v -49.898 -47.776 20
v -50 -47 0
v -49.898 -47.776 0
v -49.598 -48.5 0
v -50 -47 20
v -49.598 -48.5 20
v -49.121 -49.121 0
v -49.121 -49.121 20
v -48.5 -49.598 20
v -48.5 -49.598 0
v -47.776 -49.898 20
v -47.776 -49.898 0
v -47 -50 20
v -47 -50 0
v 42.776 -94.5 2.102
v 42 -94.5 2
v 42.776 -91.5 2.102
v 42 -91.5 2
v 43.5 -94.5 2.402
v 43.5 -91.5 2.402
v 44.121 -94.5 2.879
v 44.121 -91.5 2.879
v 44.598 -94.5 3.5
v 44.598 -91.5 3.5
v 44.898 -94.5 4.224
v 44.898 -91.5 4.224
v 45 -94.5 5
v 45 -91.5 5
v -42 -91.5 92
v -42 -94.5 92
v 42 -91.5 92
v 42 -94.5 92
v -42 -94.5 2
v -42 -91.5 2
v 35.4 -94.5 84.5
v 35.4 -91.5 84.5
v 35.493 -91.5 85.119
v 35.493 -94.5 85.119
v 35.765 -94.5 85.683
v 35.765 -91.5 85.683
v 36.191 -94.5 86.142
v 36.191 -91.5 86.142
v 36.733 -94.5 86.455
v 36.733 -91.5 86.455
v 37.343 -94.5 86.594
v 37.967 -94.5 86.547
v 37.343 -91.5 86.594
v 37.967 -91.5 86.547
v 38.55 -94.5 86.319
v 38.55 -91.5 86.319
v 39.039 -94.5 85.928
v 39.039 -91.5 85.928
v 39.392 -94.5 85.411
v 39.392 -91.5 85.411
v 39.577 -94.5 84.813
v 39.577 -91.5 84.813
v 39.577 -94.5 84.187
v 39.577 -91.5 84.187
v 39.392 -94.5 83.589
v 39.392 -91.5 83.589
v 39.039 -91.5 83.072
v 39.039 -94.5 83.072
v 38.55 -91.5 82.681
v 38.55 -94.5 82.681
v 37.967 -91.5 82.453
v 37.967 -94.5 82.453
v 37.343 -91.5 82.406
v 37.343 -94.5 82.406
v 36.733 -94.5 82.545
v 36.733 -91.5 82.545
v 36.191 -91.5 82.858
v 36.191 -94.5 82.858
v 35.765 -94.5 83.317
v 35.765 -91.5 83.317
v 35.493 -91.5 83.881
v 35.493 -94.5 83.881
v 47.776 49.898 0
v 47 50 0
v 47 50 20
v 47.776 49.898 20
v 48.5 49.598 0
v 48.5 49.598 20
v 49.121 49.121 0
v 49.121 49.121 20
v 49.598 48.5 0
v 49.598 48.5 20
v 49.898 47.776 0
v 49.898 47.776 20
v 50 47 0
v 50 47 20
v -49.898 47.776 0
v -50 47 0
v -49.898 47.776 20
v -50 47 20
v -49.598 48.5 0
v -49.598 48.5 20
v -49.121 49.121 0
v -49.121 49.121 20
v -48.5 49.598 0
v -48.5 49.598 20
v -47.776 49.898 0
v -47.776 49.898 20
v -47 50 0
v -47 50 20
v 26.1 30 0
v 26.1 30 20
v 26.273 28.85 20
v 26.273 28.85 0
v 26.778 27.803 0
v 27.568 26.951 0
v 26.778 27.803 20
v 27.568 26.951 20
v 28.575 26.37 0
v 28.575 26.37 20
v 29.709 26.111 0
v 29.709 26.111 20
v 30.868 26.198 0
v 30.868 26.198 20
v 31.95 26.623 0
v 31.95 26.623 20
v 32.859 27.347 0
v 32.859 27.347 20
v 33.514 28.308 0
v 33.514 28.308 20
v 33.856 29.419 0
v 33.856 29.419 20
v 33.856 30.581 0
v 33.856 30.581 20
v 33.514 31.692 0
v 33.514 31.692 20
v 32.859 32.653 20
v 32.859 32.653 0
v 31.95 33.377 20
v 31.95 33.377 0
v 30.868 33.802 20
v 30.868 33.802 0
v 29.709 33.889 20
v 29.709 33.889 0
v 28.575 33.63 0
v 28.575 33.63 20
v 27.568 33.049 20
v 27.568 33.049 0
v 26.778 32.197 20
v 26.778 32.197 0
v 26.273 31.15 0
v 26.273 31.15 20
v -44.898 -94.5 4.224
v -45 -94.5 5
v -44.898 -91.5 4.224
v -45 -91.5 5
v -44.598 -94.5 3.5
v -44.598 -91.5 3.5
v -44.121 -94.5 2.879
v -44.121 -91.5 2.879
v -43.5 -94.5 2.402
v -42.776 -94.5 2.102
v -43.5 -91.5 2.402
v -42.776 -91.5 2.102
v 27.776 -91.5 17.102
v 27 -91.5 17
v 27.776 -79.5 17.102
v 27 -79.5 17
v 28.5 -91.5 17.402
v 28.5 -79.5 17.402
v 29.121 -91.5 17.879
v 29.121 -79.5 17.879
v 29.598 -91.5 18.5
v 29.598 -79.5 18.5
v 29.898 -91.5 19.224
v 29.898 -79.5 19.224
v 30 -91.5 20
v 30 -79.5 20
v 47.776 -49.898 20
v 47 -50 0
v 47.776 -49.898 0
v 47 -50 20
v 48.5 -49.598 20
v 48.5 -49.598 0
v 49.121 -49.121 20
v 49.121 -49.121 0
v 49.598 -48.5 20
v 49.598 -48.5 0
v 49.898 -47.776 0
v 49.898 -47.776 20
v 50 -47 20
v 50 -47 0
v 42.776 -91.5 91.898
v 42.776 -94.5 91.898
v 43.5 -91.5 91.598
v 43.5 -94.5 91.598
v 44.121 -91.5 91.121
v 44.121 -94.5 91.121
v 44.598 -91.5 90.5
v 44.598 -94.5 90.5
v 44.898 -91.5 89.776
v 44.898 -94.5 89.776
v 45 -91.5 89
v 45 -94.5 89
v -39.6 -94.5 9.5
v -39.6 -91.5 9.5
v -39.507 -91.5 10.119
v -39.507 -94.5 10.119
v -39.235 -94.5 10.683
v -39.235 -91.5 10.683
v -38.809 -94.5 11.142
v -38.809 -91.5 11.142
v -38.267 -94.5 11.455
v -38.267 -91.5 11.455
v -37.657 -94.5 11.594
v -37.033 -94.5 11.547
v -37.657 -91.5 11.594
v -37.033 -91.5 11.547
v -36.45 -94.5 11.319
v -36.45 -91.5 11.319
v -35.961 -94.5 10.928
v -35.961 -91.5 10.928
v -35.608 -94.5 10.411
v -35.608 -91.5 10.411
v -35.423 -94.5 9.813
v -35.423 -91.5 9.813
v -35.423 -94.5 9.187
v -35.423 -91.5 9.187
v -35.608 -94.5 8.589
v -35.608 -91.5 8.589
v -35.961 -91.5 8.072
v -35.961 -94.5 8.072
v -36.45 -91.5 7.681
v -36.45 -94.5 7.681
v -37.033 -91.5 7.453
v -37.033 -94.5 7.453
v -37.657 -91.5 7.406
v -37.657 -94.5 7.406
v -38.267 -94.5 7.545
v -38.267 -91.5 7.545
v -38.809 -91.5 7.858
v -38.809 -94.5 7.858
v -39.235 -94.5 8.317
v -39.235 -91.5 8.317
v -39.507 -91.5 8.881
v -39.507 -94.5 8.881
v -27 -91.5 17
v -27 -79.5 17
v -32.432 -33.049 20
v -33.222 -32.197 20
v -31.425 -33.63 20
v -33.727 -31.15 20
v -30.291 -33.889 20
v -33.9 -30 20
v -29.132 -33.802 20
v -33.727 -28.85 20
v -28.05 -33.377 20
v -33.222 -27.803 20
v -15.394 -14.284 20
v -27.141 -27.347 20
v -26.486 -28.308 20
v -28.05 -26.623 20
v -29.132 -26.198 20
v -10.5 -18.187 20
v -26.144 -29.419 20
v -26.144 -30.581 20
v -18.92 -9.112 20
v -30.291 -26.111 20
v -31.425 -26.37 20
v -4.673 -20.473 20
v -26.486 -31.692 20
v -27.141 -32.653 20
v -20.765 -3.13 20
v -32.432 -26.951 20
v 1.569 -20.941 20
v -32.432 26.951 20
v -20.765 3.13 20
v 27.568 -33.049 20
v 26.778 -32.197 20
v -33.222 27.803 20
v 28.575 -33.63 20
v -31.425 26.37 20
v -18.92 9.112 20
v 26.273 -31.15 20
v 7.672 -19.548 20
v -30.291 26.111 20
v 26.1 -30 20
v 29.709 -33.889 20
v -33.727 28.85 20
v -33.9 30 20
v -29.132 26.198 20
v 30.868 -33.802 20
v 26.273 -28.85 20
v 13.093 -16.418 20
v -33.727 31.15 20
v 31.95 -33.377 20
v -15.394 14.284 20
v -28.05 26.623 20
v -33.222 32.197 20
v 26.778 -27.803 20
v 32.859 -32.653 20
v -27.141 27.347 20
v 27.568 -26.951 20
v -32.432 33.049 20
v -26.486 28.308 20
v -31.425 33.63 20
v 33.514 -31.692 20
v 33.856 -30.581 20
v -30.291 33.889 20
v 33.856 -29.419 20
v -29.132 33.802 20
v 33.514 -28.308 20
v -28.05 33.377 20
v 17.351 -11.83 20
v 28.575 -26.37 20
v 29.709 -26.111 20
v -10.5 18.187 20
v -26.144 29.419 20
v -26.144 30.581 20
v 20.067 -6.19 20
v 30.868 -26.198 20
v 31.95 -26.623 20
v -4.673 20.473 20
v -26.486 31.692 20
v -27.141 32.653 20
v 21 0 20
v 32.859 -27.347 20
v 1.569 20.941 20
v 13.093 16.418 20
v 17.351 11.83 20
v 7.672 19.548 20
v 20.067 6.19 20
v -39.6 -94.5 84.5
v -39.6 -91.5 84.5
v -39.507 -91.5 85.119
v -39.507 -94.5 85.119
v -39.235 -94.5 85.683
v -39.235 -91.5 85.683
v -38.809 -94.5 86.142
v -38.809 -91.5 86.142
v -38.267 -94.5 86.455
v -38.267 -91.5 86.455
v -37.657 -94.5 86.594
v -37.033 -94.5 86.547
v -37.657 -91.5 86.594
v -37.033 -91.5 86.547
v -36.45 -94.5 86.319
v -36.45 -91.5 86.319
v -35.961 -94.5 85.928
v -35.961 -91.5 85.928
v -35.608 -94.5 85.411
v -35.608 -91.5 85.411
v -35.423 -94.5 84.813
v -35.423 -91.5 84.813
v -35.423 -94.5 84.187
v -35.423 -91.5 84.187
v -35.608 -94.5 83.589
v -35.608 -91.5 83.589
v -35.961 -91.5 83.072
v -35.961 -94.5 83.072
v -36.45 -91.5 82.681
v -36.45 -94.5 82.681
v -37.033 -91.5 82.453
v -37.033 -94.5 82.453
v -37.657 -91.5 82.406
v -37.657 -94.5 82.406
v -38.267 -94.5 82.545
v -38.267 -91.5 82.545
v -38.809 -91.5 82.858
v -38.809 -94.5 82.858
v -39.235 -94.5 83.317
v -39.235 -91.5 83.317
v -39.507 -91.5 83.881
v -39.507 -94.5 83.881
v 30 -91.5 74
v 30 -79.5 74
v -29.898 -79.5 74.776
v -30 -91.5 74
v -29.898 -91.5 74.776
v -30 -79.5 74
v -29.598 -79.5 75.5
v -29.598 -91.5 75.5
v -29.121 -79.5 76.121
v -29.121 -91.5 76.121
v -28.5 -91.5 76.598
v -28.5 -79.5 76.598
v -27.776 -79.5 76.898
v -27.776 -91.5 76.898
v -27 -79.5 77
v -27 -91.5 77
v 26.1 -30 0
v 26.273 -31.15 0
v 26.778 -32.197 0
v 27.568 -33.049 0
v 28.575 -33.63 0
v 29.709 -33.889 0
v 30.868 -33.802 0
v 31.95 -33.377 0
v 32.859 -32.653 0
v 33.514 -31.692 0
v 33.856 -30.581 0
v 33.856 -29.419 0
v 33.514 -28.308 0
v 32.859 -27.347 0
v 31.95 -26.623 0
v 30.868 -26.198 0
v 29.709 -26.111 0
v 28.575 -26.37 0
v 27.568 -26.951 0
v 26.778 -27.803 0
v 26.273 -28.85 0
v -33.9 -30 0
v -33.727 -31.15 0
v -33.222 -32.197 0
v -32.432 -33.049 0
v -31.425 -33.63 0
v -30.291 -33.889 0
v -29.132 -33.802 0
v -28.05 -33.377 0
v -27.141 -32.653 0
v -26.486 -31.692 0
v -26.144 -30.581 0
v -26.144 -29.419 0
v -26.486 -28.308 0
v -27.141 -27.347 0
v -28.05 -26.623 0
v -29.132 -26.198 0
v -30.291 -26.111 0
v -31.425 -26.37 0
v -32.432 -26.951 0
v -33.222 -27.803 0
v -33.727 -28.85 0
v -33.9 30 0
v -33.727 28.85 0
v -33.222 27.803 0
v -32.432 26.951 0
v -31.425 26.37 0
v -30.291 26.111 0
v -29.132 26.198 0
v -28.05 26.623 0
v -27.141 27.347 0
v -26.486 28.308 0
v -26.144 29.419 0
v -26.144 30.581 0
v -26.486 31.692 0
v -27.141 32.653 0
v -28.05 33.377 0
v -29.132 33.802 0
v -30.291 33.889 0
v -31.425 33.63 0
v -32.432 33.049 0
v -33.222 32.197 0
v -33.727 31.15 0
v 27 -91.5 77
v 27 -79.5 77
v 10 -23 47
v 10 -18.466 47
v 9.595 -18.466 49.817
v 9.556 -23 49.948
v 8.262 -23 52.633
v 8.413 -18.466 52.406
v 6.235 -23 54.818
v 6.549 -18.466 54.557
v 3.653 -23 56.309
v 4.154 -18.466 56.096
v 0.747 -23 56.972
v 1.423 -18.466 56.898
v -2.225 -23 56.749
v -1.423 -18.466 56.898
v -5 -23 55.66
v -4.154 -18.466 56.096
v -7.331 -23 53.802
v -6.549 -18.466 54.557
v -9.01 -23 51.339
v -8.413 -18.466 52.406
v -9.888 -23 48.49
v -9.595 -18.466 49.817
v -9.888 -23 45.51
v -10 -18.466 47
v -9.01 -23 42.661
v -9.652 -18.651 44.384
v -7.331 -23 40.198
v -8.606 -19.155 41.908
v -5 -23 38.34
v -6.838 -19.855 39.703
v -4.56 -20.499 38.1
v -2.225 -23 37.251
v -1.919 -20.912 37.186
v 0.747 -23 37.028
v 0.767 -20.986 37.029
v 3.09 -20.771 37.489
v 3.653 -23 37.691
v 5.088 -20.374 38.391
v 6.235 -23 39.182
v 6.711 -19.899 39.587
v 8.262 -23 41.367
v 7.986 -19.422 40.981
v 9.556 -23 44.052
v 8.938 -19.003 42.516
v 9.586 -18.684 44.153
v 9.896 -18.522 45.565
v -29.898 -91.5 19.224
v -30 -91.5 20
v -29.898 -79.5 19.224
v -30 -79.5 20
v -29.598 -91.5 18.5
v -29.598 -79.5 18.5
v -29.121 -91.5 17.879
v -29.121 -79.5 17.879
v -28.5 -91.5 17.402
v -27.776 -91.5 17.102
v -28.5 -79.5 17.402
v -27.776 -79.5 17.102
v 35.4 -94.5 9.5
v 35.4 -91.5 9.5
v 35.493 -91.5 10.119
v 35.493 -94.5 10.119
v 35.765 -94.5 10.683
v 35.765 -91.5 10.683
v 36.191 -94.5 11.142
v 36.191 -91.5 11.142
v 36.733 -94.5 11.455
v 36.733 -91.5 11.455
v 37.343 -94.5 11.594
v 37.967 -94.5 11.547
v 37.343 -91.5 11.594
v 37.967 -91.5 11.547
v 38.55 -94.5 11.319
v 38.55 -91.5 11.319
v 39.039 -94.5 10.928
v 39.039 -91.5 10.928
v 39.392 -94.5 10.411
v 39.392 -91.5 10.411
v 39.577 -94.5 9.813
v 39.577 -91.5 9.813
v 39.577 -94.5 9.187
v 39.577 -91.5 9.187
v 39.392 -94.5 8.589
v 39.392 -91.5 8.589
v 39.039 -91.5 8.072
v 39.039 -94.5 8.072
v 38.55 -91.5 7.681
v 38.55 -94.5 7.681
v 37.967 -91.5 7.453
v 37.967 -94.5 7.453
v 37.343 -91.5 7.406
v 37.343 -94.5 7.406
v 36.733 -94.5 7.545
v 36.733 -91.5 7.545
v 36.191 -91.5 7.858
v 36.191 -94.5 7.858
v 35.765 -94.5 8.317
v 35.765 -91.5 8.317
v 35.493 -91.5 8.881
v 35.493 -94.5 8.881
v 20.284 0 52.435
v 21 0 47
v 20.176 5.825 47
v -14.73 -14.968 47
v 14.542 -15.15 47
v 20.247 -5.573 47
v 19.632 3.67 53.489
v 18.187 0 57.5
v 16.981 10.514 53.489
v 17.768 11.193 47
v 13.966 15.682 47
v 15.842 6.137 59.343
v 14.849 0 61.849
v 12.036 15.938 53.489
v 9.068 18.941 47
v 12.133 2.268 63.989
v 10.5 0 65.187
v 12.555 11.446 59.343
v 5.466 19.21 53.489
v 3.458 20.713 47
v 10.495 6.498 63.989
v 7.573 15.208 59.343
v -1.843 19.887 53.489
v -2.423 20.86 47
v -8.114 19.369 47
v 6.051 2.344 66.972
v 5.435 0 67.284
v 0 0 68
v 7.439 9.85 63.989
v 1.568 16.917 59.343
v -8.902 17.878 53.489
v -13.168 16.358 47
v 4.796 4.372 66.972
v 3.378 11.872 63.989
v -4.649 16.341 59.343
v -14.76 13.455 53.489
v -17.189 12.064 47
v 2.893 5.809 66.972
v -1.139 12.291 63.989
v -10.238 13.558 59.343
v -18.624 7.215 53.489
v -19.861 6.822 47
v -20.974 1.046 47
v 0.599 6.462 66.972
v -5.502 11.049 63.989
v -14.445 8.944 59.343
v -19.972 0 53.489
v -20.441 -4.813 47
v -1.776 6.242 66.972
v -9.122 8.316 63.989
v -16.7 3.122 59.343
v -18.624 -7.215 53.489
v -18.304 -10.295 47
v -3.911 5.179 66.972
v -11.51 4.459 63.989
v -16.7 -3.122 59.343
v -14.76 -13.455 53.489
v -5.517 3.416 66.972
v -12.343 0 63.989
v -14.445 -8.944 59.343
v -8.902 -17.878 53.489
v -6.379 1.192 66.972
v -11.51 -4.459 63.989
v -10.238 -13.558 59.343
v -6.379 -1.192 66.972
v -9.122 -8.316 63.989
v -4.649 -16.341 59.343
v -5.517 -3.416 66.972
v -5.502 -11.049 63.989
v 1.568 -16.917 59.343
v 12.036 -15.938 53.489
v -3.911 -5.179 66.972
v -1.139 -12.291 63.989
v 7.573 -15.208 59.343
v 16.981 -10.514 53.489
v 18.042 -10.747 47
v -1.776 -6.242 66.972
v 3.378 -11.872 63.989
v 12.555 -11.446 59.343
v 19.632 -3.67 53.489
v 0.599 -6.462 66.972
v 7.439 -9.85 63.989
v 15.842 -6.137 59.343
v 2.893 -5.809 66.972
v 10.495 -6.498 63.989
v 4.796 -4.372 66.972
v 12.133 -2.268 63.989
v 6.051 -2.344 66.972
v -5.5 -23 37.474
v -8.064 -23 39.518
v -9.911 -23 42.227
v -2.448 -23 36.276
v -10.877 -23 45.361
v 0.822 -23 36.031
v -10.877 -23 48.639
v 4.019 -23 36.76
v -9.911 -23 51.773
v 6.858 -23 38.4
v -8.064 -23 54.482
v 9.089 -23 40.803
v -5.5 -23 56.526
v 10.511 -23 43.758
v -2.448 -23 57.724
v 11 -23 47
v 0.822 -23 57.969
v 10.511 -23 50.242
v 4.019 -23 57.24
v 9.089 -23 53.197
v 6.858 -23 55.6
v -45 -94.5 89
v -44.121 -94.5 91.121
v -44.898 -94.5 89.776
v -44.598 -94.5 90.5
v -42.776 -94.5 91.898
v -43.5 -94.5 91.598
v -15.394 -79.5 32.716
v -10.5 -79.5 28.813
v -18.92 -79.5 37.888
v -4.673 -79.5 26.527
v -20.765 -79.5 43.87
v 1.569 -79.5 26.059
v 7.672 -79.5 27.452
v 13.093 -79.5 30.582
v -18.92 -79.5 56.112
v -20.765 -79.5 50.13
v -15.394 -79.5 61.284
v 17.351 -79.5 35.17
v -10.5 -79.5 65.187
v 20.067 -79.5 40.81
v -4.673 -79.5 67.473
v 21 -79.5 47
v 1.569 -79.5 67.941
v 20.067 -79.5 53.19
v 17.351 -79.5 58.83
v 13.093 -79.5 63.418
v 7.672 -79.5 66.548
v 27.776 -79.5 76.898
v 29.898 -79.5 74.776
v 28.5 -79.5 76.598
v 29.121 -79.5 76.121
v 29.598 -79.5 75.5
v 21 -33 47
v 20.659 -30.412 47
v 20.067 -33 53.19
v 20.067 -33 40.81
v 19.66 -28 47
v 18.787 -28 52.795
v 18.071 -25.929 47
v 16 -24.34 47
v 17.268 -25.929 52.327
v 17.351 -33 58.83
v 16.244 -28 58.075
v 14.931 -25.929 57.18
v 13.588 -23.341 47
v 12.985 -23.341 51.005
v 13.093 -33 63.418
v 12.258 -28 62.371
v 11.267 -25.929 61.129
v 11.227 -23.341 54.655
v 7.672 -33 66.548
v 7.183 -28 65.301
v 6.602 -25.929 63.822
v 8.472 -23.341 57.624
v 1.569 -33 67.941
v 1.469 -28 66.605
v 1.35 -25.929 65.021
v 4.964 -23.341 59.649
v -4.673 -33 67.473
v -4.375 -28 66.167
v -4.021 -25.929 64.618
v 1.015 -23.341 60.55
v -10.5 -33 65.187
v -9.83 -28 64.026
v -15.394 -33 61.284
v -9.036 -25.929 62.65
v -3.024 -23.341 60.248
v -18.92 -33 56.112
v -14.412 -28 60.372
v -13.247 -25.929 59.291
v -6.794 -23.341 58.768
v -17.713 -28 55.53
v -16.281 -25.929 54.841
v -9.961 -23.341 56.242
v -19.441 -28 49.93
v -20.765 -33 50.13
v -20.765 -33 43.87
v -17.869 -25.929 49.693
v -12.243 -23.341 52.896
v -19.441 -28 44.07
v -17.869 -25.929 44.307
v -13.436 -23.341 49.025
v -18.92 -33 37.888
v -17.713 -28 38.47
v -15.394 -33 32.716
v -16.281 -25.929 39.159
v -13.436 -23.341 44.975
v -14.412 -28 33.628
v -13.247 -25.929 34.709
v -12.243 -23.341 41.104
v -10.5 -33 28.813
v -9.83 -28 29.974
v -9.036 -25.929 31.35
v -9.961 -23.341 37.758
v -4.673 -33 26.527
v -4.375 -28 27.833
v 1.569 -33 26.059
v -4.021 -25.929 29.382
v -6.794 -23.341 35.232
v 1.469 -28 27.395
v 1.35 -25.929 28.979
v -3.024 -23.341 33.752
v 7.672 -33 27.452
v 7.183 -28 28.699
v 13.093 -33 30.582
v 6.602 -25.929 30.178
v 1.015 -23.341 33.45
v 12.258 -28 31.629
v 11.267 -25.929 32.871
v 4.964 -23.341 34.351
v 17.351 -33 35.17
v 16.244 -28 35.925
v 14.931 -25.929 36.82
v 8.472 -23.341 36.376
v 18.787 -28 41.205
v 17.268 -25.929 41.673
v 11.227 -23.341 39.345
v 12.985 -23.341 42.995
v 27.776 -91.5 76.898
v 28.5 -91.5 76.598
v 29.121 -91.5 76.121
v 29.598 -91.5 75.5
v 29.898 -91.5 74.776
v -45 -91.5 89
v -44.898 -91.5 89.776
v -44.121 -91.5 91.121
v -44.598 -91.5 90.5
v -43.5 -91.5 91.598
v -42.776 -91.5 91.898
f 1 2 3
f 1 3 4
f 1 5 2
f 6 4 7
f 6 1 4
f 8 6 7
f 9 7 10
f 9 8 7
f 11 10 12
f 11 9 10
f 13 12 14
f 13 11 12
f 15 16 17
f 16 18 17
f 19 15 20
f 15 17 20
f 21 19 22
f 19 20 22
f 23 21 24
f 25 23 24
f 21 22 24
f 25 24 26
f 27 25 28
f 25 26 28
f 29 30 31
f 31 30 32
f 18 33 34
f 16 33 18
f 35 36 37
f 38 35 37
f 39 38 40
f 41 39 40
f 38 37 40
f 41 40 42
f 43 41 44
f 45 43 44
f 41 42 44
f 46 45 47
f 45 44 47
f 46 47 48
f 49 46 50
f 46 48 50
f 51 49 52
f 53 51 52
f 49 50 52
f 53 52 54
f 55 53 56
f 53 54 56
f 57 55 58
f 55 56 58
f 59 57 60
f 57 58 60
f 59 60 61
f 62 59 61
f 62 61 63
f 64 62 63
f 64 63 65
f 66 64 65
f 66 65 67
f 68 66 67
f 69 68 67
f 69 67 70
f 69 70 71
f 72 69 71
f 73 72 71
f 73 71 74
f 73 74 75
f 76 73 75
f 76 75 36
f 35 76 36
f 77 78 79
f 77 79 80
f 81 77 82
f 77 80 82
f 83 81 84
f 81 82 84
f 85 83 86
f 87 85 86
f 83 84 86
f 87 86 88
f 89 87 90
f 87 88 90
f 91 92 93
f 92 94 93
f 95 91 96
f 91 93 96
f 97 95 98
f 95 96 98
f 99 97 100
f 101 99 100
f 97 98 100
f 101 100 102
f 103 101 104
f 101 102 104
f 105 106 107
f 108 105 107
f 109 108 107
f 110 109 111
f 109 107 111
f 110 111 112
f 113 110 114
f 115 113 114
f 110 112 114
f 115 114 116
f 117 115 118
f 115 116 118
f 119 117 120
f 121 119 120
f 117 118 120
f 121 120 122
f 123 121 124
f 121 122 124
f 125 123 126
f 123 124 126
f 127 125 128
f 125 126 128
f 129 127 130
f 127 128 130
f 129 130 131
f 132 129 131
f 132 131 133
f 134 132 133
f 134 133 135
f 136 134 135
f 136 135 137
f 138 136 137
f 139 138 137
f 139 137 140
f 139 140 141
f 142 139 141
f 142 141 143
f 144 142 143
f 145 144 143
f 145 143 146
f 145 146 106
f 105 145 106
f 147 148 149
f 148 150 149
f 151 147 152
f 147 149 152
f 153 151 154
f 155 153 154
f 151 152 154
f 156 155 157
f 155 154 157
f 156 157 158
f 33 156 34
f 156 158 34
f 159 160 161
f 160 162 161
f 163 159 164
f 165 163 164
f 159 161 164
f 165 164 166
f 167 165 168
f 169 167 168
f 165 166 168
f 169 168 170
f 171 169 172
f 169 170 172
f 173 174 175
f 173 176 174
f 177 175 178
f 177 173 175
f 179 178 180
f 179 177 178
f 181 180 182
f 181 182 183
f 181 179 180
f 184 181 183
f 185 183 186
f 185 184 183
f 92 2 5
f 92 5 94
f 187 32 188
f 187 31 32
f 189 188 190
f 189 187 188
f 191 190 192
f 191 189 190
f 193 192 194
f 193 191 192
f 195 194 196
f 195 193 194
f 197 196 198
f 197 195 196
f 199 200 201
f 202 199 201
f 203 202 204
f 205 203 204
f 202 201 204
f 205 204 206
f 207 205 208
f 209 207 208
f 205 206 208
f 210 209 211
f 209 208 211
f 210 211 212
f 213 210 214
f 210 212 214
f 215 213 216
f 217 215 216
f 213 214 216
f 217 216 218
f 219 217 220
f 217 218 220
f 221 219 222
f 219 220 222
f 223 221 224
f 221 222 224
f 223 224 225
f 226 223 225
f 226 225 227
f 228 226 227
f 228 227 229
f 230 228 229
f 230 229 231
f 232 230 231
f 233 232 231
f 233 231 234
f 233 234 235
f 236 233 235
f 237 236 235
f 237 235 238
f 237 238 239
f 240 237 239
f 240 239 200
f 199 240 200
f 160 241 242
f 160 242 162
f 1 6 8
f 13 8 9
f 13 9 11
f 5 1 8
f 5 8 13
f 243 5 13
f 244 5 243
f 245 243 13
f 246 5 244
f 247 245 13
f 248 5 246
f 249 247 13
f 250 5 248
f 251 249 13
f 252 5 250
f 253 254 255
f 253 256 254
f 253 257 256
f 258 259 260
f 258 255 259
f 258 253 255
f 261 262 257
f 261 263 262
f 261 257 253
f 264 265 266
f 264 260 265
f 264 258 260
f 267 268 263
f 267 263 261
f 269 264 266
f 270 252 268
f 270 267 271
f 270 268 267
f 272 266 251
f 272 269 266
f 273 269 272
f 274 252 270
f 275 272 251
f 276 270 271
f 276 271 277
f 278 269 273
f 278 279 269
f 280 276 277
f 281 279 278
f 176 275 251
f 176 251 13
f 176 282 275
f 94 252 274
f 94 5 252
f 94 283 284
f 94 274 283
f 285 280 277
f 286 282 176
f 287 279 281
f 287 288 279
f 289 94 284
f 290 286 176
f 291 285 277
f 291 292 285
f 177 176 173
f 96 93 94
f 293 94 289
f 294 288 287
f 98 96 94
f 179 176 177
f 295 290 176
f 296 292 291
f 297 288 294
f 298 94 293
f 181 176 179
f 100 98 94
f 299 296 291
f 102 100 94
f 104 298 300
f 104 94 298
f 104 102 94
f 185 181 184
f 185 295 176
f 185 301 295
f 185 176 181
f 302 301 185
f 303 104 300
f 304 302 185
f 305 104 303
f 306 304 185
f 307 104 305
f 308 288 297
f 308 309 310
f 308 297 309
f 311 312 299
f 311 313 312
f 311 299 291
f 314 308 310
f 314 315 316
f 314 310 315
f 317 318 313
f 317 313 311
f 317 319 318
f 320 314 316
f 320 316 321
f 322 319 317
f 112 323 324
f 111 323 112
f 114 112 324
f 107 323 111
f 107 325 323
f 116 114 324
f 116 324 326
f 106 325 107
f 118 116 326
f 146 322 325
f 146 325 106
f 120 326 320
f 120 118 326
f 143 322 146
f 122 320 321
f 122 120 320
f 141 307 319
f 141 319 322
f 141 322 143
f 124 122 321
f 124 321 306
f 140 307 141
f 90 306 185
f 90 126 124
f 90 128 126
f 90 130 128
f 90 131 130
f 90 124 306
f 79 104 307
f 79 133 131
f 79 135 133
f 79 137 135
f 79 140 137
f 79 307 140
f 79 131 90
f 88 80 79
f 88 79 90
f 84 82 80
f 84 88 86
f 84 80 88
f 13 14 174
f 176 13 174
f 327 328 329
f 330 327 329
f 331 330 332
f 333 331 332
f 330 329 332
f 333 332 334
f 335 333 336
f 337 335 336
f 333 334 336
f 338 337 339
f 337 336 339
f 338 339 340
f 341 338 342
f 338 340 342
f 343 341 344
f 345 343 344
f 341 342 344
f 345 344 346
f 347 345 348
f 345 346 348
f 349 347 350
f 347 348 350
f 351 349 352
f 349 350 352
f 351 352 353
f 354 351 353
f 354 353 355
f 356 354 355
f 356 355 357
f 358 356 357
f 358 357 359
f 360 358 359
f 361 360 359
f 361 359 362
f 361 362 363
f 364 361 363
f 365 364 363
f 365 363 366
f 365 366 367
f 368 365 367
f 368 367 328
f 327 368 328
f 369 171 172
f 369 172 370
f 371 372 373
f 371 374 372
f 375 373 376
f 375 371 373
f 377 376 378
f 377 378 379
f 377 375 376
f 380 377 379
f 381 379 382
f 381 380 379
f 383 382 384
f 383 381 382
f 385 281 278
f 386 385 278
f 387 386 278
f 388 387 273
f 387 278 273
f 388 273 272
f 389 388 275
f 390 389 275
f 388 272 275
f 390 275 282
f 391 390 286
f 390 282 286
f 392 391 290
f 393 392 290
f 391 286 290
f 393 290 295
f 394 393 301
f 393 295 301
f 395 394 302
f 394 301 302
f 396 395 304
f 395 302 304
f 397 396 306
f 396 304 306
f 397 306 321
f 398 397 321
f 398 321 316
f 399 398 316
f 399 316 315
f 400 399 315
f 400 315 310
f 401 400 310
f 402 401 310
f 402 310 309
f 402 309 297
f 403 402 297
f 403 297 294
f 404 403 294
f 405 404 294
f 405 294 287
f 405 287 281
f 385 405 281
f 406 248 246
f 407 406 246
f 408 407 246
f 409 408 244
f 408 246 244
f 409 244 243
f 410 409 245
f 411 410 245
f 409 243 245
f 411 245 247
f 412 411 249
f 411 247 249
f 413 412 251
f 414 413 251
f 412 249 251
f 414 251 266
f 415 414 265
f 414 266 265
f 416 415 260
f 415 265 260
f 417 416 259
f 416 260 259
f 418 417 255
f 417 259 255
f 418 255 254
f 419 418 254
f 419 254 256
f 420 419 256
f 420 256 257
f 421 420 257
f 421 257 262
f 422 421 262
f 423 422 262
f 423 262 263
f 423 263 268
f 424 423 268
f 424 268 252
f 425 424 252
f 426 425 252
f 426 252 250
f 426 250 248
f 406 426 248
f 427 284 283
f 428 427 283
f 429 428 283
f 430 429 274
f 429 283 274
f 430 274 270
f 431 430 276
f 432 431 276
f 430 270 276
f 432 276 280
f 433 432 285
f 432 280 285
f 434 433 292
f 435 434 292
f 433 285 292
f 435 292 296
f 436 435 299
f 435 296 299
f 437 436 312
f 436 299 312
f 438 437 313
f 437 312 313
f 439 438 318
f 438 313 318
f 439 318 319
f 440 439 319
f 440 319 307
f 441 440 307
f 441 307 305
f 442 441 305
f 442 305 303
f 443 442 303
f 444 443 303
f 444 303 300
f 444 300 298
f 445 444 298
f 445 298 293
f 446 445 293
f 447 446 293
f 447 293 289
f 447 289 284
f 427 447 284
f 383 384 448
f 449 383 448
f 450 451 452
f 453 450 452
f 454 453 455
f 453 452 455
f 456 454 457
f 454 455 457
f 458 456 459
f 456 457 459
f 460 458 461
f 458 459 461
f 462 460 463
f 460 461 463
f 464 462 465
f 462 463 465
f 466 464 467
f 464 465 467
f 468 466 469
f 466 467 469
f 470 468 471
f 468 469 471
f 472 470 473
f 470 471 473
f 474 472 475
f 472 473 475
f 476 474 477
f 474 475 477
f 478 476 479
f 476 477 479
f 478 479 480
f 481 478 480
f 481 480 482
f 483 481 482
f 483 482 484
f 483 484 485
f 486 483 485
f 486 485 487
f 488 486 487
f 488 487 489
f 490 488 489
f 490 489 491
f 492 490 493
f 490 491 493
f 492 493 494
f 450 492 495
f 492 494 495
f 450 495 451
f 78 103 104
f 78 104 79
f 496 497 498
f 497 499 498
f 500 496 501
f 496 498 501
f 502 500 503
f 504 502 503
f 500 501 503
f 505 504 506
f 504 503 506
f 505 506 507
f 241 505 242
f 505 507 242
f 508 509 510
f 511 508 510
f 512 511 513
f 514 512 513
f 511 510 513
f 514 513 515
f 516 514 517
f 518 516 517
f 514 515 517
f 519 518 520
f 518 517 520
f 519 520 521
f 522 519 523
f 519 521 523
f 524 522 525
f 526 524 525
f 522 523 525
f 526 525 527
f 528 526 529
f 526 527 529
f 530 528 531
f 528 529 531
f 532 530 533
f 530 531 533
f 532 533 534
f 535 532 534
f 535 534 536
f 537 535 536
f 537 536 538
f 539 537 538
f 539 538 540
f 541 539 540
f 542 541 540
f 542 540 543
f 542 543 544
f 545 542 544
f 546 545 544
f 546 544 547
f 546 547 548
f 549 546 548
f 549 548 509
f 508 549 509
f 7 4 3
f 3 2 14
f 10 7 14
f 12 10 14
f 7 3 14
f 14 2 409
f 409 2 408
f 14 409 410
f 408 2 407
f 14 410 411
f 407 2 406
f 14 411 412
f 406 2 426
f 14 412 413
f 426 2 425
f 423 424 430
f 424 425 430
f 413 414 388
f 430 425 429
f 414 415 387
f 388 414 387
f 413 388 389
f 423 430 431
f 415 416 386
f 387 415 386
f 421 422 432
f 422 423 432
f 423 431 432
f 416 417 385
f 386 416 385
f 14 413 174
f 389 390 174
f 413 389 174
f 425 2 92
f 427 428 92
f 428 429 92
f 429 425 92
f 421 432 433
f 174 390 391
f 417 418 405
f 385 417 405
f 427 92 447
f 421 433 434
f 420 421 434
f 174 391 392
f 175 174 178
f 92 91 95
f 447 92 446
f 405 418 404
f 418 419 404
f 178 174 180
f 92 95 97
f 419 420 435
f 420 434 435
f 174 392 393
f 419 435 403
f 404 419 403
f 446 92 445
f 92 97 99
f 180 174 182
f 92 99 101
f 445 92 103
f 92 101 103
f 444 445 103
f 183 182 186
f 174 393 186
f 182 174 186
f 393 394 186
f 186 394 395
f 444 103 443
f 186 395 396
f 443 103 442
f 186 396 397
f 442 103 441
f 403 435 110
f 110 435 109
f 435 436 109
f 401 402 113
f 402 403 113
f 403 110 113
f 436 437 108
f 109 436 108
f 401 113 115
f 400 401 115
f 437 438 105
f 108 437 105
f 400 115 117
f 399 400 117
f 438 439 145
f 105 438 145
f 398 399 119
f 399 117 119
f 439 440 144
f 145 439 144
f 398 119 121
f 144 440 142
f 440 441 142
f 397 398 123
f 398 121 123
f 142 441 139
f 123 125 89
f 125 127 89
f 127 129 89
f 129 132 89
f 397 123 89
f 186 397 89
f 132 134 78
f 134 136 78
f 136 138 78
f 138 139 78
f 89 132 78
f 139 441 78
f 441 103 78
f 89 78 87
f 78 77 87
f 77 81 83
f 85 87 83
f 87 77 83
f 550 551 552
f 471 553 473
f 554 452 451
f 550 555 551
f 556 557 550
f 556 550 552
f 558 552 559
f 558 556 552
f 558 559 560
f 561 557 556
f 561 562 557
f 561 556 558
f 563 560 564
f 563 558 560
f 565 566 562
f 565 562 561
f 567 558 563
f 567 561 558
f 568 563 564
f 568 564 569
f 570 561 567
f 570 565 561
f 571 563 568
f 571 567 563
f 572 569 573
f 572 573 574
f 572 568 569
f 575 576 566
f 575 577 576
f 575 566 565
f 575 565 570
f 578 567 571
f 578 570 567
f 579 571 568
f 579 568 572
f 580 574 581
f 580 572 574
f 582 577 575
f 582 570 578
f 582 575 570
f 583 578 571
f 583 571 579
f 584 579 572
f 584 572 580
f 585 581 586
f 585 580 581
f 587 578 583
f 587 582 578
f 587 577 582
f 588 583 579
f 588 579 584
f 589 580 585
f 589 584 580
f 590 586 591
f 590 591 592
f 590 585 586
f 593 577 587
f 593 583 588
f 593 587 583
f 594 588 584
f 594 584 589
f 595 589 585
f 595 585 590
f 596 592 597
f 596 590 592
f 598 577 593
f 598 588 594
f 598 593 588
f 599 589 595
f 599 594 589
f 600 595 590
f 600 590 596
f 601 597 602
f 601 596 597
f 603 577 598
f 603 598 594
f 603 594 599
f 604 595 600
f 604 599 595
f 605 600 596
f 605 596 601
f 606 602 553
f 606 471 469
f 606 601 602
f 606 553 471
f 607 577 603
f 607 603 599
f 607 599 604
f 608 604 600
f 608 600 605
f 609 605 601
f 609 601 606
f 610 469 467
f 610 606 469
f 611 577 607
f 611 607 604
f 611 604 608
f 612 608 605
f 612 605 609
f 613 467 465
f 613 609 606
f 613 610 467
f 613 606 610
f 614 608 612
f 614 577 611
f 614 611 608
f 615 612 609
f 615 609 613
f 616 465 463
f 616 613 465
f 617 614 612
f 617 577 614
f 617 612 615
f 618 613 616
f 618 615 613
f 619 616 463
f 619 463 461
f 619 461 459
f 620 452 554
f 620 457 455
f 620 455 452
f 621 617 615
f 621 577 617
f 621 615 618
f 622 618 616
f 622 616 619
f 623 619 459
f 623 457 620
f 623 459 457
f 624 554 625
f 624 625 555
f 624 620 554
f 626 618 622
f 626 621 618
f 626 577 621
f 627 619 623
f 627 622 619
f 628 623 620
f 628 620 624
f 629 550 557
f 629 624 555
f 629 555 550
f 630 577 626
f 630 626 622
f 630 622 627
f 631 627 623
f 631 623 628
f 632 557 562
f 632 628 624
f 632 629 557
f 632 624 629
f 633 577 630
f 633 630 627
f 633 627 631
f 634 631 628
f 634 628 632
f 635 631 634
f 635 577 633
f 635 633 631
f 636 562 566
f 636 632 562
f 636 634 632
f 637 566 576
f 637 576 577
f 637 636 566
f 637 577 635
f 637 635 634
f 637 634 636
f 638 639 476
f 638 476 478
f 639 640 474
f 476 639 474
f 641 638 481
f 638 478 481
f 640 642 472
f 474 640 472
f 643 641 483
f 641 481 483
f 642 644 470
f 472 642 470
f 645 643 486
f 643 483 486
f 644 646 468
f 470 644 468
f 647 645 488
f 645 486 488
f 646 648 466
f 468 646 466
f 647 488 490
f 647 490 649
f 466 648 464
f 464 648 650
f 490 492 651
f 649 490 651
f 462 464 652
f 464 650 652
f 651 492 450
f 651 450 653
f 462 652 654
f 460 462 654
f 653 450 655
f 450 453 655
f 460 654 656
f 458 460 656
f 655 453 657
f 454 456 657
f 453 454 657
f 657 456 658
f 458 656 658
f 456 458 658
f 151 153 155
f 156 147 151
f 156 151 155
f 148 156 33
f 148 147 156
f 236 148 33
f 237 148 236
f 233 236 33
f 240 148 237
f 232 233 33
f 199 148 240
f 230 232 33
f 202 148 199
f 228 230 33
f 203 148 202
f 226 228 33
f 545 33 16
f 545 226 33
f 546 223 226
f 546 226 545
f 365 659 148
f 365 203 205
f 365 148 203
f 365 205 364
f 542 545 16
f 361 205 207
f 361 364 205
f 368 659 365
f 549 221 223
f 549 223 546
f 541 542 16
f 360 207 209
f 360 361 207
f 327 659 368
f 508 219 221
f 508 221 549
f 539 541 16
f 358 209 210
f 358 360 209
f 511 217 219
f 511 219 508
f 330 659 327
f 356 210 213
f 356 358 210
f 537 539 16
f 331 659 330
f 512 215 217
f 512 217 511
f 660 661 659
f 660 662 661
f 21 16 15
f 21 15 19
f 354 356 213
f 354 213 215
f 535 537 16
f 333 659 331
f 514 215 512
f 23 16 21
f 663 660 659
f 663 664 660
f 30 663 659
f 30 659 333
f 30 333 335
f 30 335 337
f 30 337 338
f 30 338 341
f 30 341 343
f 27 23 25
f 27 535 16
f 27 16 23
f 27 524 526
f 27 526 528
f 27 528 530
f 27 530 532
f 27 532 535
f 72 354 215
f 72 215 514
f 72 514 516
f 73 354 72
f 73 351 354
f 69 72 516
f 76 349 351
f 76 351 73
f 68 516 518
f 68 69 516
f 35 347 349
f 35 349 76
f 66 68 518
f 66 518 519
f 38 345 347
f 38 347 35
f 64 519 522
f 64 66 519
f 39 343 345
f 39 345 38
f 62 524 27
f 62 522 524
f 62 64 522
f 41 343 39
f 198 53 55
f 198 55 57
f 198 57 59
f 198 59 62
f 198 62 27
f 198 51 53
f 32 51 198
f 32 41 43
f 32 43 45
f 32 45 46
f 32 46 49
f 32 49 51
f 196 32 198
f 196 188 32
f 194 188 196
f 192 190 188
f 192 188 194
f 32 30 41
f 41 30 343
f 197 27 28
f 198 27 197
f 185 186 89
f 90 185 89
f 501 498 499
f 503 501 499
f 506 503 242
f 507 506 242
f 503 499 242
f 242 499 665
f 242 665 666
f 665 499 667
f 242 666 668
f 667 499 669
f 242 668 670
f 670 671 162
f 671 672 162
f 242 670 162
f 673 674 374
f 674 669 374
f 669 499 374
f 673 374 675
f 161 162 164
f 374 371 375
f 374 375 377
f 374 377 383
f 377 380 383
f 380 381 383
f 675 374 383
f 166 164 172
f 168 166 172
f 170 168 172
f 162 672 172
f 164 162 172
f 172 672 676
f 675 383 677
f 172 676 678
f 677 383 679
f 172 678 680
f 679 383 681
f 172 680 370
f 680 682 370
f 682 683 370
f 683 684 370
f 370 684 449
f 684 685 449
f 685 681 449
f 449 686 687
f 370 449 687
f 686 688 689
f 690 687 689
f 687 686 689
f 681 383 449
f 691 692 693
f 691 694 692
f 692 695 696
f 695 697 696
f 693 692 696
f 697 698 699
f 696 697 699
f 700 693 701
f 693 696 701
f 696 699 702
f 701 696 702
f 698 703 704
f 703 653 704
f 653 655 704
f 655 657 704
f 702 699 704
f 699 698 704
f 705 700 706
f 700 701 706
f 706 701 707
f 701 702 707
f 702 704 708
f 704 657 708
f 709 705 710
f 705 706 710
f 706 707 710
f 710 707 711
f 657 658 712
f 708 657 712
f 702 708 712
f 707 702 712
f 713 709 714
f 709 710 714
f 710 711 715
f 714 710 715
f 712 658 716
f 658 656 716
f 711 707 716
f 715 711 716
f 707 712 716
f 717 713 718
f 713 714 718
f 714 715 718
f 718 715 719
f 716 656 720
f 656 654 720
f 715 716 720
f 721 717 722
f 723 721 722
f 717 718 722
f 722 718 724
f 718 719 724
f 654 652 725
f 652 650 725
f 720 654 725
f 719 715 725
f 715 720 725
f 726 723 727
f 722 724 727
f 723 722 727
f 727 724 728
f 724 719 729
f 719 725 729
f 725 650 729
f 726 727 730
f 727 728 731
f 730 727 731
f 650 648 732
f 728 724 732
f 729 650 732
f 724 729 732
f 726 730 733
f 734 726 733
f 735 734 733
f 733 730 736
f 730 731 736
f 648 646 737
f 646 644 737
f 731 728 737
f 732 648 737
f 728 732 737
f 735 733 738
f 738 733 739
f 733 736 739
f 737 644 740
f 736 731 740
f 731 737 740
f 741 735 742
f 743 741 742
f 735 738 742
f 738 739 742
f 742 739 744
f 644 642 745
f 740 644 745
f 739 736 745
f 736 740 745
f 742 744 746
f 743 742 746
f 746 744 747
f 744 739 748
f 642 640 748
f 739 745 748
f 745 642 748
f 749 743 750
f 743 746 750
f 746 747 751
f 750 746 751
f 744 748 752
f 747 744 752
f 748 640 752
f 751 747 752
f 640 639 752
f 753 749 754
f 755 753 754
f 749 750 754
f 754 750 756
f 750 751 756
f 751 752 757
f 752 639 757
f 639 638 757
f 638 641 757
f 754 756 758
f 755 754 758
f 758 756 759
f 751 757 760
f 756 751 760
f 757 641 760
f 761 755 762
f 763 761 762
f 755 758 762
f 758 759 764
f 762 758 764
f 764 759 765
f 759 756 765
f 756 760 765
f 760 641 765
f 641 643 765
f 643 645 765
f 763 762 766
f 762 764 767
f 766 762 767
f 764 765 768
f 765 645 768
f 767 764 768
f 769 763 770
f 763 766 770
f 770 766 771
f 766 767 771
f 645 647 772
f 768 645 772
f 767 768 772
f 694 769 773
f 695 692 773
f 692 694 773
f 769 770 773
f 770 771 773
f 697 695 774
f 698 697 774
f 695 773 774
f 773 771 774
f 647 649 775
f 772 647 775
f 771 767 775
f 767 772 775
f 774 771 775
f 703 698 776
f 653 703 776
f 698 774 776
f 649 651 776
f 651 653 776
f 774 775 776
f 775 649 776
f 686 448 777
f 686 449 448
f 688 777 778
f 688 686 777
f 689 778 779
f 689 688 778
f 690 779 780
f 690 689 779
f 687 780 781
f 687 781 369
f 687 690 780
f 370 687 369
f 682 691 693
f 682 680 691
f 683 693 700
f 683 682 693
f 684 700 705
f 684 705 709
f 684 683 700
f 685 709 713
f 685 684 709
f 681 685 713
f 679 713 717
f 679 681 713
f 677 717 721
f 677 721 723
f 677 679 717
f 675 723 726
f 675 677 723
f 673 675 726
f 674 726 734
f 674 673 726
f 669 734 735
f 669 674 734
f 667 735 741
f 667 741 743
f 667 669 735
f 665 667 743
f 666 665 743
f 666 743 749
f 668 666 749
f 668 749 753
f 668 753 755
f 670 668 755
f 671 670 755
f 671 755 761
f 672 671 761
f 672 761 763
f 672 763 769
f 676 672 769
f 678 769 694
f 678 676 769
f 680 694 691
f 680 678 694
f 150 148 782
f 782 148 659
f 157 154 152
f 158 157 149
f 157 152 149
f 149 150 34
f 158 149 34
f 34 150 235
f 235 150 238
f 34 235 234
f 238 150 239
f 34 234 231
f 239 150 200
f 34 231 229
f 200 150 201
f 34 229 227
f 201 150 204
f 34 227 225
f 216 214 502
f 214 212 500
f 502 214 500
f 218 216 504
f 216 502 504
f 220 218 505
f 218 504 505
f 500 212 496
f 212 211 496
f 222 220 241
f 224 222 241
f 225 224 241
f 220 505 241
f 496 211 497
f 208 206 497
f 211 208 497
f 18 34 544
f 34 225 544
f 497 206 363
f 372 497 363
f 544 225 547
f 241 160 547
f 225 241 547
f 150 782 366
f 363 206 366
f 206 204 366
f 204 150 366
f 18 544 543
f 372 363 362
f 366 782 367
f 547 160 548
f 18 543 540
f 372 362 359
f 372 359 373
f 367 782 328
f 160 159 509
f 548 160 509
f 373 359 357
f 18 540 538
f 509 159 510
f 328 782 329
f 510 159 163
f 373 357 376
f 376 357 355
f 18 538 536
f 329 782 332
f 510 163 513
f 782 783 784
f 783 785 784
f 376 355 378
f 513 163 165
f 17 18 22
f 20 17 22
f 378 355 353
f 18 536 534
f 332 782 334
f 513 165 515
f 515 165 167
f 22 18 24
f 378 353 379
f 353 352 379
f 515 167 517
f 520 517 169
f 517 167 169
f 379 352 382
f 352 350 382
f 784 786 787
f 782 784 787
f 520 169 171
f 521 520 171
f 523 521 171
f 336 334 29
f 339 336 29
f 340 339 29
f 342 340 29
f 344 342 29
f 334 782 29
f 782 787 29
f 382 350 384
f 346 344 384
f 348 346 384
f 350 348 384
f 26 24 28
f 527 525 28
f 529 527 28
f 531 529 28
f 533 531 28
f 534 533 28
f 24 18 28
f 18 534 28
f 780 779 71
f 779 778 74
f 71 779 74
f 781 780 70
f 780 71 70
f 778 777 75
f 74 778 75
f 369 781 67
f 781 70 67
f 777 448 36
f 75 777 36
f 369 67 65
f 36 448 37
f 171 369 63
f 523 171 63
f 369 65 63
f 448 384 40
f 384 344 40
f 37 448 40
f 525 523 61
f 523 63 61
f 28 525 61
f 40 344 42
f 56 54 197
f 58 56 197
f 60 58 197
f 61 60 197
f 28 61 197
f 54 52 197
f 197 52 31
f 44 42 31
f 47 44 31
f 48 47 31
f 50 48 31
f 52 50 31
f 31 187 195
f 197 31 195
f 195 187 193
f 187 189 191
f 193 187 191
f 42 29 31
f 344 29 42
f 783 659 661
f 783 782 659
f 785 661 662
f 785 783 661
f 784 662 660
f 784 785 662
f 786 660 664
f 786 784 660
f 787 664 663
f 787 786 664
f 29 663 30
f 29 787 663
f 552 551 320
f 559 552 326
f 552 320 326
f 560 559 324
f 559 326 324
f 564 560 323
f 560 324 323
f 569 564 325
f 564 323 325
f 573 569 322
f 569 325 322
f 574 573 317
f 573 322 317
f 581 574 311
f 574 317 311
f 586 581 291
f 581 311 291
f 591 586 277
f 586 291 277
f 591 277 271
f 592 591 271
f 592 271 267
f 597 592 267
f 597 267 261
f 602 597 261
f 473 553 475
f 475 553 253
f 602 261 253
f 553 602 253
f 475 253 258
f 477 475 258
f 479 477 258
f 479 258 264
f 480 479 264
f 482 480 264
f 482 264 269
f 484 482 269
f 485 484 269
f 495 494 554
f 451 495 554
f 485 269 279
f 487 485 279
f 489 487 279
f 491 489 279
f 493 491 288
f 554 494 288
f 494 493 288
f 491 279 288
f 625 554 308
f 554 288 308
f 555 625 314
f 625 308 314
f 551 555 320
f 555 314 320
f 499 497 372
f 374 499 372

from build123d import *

# Parameters (mm, degrees)
F0_W          = 100
F0_H          = 100
F1_DEPTH      = 20
F2_R          = 21
F3_DEPTH      = 48
F4_R          = 21
F5_R          = 10
F6_DEPTH      = 41
F7_R          = 21
F8_DEPTH      = 53.5
F8_DEPTH_BACK = 18
F9_R          = 10
F10_W         = 60
F10_H         = 60
F11_DEPTH     = 15
F12_W         = 90
F12_H         = 90
F13_DEPTH     = 3
F15_D         = 4.2
F15_DEPTH     = 10
F15_TIP       = 1.2618073
F17_D         = 7.8
F18_R         = 3


with BuildPart() as f1:
    # F0 (on Top) → F1 (new body)
    with BuildSketch(Plane.XY):
        Rectangle(F0_W, F0_H)
    extrude(amount=F1_DEPTH)

    # F2 (on face) → F3 (join)
    with BuildSketch(Plane.XY.offset(20)):
        Circle(F2_R)
    extrude(amount=F3_DEPTH)

    # F4
    f4_edges = [f1.edges().sort_by_distance(p)[0] for p in [
        (-21, 0, 68),
    ]]
    fillet(f4_edges, radius=F4_R)

    # F5 (on Front) → F6 (join)
    with BuildSketch(Plane.XZ):
        with Locations((0, 47)):
            Circle(F5_R)
    extrude(amount=F6_DEPTH)

    # F7 (on face) → F8 (join, two sides)
    with BuildSketch(Plane.XZ.offset(41)) as f8_sk:
        with Locations((0, 47)):
            Circle(F7_R)
    extrude(amount=F8_DEPTH)
    extrude(f8_sk.sketch, amount=-F8_DEPTH_BACK)

    # F9
    f9_edges = [f1.edges().sort_by_distance(p)[0] for p in [
        (-21, -23, 47),
    ]]
    fillet(f9_edges, radius=F9_R)

    # F10 (on face) → F11 (join)
    with BuildSketch(Plane.XZ.offset(94.5)):
        with Locations((0, 47)):
            Rectangle(F10_W, F10_H)
    extrude(amount=-F11_DEPTH)

    # F12 (on face) → F13 (join)
    with BuildSketch(Plane.XZ.offset(94.5)):
        with Locations((0, 47)):
            Rectangle(F12_W, F12_H)
    extrude(amount=-F13_DEPTH)

    # F15
    with Locations(Plane.XZ.offset(94.5)):
        with Locations((-37.5, 84.5), (37.5, 84.5), (37.5, 9.5), (-37.5, 9.5)):
            Hole(F15_D / 2, depth=F15_DEPTH)
            with Locations((0, 0, -(F15_DEPTH + F15_TIP / 2))):  # 118° drill point
                Cone(0, F15_D / 2, F15_TIP, mode=Mode.SUBTRACT)

    # F17 (through all)
    with Locations(Plane(origin=(0, 0, 0), x_dir=(1, 0, 0), z_dir=(0, 0, -1))):
        with Locations((-30, 30), (30, 30), (30, -30), (-30, -30)):
            Hole(F17_D / 2)

    # F18
    f18_edges = [f1.edges().sort_by_distance(p)[0] for p in [
        (-50, -50, 10),
        (-50, 50, 10),
        (50, 50, 10),
        (50, -50, 10),
        (30, -85.5, 17),
        (45, -93, 2),
        (-30, -85.5, 17),
        (-45, -93, 2),
        (-30, -85.5, 77),
        (-45, -93, 92),
        (30, -85.5, 77),
        (45, -93, 92),
    ]]
    fillet(f18_edges, radius=F18_R)


solid = f1.part
